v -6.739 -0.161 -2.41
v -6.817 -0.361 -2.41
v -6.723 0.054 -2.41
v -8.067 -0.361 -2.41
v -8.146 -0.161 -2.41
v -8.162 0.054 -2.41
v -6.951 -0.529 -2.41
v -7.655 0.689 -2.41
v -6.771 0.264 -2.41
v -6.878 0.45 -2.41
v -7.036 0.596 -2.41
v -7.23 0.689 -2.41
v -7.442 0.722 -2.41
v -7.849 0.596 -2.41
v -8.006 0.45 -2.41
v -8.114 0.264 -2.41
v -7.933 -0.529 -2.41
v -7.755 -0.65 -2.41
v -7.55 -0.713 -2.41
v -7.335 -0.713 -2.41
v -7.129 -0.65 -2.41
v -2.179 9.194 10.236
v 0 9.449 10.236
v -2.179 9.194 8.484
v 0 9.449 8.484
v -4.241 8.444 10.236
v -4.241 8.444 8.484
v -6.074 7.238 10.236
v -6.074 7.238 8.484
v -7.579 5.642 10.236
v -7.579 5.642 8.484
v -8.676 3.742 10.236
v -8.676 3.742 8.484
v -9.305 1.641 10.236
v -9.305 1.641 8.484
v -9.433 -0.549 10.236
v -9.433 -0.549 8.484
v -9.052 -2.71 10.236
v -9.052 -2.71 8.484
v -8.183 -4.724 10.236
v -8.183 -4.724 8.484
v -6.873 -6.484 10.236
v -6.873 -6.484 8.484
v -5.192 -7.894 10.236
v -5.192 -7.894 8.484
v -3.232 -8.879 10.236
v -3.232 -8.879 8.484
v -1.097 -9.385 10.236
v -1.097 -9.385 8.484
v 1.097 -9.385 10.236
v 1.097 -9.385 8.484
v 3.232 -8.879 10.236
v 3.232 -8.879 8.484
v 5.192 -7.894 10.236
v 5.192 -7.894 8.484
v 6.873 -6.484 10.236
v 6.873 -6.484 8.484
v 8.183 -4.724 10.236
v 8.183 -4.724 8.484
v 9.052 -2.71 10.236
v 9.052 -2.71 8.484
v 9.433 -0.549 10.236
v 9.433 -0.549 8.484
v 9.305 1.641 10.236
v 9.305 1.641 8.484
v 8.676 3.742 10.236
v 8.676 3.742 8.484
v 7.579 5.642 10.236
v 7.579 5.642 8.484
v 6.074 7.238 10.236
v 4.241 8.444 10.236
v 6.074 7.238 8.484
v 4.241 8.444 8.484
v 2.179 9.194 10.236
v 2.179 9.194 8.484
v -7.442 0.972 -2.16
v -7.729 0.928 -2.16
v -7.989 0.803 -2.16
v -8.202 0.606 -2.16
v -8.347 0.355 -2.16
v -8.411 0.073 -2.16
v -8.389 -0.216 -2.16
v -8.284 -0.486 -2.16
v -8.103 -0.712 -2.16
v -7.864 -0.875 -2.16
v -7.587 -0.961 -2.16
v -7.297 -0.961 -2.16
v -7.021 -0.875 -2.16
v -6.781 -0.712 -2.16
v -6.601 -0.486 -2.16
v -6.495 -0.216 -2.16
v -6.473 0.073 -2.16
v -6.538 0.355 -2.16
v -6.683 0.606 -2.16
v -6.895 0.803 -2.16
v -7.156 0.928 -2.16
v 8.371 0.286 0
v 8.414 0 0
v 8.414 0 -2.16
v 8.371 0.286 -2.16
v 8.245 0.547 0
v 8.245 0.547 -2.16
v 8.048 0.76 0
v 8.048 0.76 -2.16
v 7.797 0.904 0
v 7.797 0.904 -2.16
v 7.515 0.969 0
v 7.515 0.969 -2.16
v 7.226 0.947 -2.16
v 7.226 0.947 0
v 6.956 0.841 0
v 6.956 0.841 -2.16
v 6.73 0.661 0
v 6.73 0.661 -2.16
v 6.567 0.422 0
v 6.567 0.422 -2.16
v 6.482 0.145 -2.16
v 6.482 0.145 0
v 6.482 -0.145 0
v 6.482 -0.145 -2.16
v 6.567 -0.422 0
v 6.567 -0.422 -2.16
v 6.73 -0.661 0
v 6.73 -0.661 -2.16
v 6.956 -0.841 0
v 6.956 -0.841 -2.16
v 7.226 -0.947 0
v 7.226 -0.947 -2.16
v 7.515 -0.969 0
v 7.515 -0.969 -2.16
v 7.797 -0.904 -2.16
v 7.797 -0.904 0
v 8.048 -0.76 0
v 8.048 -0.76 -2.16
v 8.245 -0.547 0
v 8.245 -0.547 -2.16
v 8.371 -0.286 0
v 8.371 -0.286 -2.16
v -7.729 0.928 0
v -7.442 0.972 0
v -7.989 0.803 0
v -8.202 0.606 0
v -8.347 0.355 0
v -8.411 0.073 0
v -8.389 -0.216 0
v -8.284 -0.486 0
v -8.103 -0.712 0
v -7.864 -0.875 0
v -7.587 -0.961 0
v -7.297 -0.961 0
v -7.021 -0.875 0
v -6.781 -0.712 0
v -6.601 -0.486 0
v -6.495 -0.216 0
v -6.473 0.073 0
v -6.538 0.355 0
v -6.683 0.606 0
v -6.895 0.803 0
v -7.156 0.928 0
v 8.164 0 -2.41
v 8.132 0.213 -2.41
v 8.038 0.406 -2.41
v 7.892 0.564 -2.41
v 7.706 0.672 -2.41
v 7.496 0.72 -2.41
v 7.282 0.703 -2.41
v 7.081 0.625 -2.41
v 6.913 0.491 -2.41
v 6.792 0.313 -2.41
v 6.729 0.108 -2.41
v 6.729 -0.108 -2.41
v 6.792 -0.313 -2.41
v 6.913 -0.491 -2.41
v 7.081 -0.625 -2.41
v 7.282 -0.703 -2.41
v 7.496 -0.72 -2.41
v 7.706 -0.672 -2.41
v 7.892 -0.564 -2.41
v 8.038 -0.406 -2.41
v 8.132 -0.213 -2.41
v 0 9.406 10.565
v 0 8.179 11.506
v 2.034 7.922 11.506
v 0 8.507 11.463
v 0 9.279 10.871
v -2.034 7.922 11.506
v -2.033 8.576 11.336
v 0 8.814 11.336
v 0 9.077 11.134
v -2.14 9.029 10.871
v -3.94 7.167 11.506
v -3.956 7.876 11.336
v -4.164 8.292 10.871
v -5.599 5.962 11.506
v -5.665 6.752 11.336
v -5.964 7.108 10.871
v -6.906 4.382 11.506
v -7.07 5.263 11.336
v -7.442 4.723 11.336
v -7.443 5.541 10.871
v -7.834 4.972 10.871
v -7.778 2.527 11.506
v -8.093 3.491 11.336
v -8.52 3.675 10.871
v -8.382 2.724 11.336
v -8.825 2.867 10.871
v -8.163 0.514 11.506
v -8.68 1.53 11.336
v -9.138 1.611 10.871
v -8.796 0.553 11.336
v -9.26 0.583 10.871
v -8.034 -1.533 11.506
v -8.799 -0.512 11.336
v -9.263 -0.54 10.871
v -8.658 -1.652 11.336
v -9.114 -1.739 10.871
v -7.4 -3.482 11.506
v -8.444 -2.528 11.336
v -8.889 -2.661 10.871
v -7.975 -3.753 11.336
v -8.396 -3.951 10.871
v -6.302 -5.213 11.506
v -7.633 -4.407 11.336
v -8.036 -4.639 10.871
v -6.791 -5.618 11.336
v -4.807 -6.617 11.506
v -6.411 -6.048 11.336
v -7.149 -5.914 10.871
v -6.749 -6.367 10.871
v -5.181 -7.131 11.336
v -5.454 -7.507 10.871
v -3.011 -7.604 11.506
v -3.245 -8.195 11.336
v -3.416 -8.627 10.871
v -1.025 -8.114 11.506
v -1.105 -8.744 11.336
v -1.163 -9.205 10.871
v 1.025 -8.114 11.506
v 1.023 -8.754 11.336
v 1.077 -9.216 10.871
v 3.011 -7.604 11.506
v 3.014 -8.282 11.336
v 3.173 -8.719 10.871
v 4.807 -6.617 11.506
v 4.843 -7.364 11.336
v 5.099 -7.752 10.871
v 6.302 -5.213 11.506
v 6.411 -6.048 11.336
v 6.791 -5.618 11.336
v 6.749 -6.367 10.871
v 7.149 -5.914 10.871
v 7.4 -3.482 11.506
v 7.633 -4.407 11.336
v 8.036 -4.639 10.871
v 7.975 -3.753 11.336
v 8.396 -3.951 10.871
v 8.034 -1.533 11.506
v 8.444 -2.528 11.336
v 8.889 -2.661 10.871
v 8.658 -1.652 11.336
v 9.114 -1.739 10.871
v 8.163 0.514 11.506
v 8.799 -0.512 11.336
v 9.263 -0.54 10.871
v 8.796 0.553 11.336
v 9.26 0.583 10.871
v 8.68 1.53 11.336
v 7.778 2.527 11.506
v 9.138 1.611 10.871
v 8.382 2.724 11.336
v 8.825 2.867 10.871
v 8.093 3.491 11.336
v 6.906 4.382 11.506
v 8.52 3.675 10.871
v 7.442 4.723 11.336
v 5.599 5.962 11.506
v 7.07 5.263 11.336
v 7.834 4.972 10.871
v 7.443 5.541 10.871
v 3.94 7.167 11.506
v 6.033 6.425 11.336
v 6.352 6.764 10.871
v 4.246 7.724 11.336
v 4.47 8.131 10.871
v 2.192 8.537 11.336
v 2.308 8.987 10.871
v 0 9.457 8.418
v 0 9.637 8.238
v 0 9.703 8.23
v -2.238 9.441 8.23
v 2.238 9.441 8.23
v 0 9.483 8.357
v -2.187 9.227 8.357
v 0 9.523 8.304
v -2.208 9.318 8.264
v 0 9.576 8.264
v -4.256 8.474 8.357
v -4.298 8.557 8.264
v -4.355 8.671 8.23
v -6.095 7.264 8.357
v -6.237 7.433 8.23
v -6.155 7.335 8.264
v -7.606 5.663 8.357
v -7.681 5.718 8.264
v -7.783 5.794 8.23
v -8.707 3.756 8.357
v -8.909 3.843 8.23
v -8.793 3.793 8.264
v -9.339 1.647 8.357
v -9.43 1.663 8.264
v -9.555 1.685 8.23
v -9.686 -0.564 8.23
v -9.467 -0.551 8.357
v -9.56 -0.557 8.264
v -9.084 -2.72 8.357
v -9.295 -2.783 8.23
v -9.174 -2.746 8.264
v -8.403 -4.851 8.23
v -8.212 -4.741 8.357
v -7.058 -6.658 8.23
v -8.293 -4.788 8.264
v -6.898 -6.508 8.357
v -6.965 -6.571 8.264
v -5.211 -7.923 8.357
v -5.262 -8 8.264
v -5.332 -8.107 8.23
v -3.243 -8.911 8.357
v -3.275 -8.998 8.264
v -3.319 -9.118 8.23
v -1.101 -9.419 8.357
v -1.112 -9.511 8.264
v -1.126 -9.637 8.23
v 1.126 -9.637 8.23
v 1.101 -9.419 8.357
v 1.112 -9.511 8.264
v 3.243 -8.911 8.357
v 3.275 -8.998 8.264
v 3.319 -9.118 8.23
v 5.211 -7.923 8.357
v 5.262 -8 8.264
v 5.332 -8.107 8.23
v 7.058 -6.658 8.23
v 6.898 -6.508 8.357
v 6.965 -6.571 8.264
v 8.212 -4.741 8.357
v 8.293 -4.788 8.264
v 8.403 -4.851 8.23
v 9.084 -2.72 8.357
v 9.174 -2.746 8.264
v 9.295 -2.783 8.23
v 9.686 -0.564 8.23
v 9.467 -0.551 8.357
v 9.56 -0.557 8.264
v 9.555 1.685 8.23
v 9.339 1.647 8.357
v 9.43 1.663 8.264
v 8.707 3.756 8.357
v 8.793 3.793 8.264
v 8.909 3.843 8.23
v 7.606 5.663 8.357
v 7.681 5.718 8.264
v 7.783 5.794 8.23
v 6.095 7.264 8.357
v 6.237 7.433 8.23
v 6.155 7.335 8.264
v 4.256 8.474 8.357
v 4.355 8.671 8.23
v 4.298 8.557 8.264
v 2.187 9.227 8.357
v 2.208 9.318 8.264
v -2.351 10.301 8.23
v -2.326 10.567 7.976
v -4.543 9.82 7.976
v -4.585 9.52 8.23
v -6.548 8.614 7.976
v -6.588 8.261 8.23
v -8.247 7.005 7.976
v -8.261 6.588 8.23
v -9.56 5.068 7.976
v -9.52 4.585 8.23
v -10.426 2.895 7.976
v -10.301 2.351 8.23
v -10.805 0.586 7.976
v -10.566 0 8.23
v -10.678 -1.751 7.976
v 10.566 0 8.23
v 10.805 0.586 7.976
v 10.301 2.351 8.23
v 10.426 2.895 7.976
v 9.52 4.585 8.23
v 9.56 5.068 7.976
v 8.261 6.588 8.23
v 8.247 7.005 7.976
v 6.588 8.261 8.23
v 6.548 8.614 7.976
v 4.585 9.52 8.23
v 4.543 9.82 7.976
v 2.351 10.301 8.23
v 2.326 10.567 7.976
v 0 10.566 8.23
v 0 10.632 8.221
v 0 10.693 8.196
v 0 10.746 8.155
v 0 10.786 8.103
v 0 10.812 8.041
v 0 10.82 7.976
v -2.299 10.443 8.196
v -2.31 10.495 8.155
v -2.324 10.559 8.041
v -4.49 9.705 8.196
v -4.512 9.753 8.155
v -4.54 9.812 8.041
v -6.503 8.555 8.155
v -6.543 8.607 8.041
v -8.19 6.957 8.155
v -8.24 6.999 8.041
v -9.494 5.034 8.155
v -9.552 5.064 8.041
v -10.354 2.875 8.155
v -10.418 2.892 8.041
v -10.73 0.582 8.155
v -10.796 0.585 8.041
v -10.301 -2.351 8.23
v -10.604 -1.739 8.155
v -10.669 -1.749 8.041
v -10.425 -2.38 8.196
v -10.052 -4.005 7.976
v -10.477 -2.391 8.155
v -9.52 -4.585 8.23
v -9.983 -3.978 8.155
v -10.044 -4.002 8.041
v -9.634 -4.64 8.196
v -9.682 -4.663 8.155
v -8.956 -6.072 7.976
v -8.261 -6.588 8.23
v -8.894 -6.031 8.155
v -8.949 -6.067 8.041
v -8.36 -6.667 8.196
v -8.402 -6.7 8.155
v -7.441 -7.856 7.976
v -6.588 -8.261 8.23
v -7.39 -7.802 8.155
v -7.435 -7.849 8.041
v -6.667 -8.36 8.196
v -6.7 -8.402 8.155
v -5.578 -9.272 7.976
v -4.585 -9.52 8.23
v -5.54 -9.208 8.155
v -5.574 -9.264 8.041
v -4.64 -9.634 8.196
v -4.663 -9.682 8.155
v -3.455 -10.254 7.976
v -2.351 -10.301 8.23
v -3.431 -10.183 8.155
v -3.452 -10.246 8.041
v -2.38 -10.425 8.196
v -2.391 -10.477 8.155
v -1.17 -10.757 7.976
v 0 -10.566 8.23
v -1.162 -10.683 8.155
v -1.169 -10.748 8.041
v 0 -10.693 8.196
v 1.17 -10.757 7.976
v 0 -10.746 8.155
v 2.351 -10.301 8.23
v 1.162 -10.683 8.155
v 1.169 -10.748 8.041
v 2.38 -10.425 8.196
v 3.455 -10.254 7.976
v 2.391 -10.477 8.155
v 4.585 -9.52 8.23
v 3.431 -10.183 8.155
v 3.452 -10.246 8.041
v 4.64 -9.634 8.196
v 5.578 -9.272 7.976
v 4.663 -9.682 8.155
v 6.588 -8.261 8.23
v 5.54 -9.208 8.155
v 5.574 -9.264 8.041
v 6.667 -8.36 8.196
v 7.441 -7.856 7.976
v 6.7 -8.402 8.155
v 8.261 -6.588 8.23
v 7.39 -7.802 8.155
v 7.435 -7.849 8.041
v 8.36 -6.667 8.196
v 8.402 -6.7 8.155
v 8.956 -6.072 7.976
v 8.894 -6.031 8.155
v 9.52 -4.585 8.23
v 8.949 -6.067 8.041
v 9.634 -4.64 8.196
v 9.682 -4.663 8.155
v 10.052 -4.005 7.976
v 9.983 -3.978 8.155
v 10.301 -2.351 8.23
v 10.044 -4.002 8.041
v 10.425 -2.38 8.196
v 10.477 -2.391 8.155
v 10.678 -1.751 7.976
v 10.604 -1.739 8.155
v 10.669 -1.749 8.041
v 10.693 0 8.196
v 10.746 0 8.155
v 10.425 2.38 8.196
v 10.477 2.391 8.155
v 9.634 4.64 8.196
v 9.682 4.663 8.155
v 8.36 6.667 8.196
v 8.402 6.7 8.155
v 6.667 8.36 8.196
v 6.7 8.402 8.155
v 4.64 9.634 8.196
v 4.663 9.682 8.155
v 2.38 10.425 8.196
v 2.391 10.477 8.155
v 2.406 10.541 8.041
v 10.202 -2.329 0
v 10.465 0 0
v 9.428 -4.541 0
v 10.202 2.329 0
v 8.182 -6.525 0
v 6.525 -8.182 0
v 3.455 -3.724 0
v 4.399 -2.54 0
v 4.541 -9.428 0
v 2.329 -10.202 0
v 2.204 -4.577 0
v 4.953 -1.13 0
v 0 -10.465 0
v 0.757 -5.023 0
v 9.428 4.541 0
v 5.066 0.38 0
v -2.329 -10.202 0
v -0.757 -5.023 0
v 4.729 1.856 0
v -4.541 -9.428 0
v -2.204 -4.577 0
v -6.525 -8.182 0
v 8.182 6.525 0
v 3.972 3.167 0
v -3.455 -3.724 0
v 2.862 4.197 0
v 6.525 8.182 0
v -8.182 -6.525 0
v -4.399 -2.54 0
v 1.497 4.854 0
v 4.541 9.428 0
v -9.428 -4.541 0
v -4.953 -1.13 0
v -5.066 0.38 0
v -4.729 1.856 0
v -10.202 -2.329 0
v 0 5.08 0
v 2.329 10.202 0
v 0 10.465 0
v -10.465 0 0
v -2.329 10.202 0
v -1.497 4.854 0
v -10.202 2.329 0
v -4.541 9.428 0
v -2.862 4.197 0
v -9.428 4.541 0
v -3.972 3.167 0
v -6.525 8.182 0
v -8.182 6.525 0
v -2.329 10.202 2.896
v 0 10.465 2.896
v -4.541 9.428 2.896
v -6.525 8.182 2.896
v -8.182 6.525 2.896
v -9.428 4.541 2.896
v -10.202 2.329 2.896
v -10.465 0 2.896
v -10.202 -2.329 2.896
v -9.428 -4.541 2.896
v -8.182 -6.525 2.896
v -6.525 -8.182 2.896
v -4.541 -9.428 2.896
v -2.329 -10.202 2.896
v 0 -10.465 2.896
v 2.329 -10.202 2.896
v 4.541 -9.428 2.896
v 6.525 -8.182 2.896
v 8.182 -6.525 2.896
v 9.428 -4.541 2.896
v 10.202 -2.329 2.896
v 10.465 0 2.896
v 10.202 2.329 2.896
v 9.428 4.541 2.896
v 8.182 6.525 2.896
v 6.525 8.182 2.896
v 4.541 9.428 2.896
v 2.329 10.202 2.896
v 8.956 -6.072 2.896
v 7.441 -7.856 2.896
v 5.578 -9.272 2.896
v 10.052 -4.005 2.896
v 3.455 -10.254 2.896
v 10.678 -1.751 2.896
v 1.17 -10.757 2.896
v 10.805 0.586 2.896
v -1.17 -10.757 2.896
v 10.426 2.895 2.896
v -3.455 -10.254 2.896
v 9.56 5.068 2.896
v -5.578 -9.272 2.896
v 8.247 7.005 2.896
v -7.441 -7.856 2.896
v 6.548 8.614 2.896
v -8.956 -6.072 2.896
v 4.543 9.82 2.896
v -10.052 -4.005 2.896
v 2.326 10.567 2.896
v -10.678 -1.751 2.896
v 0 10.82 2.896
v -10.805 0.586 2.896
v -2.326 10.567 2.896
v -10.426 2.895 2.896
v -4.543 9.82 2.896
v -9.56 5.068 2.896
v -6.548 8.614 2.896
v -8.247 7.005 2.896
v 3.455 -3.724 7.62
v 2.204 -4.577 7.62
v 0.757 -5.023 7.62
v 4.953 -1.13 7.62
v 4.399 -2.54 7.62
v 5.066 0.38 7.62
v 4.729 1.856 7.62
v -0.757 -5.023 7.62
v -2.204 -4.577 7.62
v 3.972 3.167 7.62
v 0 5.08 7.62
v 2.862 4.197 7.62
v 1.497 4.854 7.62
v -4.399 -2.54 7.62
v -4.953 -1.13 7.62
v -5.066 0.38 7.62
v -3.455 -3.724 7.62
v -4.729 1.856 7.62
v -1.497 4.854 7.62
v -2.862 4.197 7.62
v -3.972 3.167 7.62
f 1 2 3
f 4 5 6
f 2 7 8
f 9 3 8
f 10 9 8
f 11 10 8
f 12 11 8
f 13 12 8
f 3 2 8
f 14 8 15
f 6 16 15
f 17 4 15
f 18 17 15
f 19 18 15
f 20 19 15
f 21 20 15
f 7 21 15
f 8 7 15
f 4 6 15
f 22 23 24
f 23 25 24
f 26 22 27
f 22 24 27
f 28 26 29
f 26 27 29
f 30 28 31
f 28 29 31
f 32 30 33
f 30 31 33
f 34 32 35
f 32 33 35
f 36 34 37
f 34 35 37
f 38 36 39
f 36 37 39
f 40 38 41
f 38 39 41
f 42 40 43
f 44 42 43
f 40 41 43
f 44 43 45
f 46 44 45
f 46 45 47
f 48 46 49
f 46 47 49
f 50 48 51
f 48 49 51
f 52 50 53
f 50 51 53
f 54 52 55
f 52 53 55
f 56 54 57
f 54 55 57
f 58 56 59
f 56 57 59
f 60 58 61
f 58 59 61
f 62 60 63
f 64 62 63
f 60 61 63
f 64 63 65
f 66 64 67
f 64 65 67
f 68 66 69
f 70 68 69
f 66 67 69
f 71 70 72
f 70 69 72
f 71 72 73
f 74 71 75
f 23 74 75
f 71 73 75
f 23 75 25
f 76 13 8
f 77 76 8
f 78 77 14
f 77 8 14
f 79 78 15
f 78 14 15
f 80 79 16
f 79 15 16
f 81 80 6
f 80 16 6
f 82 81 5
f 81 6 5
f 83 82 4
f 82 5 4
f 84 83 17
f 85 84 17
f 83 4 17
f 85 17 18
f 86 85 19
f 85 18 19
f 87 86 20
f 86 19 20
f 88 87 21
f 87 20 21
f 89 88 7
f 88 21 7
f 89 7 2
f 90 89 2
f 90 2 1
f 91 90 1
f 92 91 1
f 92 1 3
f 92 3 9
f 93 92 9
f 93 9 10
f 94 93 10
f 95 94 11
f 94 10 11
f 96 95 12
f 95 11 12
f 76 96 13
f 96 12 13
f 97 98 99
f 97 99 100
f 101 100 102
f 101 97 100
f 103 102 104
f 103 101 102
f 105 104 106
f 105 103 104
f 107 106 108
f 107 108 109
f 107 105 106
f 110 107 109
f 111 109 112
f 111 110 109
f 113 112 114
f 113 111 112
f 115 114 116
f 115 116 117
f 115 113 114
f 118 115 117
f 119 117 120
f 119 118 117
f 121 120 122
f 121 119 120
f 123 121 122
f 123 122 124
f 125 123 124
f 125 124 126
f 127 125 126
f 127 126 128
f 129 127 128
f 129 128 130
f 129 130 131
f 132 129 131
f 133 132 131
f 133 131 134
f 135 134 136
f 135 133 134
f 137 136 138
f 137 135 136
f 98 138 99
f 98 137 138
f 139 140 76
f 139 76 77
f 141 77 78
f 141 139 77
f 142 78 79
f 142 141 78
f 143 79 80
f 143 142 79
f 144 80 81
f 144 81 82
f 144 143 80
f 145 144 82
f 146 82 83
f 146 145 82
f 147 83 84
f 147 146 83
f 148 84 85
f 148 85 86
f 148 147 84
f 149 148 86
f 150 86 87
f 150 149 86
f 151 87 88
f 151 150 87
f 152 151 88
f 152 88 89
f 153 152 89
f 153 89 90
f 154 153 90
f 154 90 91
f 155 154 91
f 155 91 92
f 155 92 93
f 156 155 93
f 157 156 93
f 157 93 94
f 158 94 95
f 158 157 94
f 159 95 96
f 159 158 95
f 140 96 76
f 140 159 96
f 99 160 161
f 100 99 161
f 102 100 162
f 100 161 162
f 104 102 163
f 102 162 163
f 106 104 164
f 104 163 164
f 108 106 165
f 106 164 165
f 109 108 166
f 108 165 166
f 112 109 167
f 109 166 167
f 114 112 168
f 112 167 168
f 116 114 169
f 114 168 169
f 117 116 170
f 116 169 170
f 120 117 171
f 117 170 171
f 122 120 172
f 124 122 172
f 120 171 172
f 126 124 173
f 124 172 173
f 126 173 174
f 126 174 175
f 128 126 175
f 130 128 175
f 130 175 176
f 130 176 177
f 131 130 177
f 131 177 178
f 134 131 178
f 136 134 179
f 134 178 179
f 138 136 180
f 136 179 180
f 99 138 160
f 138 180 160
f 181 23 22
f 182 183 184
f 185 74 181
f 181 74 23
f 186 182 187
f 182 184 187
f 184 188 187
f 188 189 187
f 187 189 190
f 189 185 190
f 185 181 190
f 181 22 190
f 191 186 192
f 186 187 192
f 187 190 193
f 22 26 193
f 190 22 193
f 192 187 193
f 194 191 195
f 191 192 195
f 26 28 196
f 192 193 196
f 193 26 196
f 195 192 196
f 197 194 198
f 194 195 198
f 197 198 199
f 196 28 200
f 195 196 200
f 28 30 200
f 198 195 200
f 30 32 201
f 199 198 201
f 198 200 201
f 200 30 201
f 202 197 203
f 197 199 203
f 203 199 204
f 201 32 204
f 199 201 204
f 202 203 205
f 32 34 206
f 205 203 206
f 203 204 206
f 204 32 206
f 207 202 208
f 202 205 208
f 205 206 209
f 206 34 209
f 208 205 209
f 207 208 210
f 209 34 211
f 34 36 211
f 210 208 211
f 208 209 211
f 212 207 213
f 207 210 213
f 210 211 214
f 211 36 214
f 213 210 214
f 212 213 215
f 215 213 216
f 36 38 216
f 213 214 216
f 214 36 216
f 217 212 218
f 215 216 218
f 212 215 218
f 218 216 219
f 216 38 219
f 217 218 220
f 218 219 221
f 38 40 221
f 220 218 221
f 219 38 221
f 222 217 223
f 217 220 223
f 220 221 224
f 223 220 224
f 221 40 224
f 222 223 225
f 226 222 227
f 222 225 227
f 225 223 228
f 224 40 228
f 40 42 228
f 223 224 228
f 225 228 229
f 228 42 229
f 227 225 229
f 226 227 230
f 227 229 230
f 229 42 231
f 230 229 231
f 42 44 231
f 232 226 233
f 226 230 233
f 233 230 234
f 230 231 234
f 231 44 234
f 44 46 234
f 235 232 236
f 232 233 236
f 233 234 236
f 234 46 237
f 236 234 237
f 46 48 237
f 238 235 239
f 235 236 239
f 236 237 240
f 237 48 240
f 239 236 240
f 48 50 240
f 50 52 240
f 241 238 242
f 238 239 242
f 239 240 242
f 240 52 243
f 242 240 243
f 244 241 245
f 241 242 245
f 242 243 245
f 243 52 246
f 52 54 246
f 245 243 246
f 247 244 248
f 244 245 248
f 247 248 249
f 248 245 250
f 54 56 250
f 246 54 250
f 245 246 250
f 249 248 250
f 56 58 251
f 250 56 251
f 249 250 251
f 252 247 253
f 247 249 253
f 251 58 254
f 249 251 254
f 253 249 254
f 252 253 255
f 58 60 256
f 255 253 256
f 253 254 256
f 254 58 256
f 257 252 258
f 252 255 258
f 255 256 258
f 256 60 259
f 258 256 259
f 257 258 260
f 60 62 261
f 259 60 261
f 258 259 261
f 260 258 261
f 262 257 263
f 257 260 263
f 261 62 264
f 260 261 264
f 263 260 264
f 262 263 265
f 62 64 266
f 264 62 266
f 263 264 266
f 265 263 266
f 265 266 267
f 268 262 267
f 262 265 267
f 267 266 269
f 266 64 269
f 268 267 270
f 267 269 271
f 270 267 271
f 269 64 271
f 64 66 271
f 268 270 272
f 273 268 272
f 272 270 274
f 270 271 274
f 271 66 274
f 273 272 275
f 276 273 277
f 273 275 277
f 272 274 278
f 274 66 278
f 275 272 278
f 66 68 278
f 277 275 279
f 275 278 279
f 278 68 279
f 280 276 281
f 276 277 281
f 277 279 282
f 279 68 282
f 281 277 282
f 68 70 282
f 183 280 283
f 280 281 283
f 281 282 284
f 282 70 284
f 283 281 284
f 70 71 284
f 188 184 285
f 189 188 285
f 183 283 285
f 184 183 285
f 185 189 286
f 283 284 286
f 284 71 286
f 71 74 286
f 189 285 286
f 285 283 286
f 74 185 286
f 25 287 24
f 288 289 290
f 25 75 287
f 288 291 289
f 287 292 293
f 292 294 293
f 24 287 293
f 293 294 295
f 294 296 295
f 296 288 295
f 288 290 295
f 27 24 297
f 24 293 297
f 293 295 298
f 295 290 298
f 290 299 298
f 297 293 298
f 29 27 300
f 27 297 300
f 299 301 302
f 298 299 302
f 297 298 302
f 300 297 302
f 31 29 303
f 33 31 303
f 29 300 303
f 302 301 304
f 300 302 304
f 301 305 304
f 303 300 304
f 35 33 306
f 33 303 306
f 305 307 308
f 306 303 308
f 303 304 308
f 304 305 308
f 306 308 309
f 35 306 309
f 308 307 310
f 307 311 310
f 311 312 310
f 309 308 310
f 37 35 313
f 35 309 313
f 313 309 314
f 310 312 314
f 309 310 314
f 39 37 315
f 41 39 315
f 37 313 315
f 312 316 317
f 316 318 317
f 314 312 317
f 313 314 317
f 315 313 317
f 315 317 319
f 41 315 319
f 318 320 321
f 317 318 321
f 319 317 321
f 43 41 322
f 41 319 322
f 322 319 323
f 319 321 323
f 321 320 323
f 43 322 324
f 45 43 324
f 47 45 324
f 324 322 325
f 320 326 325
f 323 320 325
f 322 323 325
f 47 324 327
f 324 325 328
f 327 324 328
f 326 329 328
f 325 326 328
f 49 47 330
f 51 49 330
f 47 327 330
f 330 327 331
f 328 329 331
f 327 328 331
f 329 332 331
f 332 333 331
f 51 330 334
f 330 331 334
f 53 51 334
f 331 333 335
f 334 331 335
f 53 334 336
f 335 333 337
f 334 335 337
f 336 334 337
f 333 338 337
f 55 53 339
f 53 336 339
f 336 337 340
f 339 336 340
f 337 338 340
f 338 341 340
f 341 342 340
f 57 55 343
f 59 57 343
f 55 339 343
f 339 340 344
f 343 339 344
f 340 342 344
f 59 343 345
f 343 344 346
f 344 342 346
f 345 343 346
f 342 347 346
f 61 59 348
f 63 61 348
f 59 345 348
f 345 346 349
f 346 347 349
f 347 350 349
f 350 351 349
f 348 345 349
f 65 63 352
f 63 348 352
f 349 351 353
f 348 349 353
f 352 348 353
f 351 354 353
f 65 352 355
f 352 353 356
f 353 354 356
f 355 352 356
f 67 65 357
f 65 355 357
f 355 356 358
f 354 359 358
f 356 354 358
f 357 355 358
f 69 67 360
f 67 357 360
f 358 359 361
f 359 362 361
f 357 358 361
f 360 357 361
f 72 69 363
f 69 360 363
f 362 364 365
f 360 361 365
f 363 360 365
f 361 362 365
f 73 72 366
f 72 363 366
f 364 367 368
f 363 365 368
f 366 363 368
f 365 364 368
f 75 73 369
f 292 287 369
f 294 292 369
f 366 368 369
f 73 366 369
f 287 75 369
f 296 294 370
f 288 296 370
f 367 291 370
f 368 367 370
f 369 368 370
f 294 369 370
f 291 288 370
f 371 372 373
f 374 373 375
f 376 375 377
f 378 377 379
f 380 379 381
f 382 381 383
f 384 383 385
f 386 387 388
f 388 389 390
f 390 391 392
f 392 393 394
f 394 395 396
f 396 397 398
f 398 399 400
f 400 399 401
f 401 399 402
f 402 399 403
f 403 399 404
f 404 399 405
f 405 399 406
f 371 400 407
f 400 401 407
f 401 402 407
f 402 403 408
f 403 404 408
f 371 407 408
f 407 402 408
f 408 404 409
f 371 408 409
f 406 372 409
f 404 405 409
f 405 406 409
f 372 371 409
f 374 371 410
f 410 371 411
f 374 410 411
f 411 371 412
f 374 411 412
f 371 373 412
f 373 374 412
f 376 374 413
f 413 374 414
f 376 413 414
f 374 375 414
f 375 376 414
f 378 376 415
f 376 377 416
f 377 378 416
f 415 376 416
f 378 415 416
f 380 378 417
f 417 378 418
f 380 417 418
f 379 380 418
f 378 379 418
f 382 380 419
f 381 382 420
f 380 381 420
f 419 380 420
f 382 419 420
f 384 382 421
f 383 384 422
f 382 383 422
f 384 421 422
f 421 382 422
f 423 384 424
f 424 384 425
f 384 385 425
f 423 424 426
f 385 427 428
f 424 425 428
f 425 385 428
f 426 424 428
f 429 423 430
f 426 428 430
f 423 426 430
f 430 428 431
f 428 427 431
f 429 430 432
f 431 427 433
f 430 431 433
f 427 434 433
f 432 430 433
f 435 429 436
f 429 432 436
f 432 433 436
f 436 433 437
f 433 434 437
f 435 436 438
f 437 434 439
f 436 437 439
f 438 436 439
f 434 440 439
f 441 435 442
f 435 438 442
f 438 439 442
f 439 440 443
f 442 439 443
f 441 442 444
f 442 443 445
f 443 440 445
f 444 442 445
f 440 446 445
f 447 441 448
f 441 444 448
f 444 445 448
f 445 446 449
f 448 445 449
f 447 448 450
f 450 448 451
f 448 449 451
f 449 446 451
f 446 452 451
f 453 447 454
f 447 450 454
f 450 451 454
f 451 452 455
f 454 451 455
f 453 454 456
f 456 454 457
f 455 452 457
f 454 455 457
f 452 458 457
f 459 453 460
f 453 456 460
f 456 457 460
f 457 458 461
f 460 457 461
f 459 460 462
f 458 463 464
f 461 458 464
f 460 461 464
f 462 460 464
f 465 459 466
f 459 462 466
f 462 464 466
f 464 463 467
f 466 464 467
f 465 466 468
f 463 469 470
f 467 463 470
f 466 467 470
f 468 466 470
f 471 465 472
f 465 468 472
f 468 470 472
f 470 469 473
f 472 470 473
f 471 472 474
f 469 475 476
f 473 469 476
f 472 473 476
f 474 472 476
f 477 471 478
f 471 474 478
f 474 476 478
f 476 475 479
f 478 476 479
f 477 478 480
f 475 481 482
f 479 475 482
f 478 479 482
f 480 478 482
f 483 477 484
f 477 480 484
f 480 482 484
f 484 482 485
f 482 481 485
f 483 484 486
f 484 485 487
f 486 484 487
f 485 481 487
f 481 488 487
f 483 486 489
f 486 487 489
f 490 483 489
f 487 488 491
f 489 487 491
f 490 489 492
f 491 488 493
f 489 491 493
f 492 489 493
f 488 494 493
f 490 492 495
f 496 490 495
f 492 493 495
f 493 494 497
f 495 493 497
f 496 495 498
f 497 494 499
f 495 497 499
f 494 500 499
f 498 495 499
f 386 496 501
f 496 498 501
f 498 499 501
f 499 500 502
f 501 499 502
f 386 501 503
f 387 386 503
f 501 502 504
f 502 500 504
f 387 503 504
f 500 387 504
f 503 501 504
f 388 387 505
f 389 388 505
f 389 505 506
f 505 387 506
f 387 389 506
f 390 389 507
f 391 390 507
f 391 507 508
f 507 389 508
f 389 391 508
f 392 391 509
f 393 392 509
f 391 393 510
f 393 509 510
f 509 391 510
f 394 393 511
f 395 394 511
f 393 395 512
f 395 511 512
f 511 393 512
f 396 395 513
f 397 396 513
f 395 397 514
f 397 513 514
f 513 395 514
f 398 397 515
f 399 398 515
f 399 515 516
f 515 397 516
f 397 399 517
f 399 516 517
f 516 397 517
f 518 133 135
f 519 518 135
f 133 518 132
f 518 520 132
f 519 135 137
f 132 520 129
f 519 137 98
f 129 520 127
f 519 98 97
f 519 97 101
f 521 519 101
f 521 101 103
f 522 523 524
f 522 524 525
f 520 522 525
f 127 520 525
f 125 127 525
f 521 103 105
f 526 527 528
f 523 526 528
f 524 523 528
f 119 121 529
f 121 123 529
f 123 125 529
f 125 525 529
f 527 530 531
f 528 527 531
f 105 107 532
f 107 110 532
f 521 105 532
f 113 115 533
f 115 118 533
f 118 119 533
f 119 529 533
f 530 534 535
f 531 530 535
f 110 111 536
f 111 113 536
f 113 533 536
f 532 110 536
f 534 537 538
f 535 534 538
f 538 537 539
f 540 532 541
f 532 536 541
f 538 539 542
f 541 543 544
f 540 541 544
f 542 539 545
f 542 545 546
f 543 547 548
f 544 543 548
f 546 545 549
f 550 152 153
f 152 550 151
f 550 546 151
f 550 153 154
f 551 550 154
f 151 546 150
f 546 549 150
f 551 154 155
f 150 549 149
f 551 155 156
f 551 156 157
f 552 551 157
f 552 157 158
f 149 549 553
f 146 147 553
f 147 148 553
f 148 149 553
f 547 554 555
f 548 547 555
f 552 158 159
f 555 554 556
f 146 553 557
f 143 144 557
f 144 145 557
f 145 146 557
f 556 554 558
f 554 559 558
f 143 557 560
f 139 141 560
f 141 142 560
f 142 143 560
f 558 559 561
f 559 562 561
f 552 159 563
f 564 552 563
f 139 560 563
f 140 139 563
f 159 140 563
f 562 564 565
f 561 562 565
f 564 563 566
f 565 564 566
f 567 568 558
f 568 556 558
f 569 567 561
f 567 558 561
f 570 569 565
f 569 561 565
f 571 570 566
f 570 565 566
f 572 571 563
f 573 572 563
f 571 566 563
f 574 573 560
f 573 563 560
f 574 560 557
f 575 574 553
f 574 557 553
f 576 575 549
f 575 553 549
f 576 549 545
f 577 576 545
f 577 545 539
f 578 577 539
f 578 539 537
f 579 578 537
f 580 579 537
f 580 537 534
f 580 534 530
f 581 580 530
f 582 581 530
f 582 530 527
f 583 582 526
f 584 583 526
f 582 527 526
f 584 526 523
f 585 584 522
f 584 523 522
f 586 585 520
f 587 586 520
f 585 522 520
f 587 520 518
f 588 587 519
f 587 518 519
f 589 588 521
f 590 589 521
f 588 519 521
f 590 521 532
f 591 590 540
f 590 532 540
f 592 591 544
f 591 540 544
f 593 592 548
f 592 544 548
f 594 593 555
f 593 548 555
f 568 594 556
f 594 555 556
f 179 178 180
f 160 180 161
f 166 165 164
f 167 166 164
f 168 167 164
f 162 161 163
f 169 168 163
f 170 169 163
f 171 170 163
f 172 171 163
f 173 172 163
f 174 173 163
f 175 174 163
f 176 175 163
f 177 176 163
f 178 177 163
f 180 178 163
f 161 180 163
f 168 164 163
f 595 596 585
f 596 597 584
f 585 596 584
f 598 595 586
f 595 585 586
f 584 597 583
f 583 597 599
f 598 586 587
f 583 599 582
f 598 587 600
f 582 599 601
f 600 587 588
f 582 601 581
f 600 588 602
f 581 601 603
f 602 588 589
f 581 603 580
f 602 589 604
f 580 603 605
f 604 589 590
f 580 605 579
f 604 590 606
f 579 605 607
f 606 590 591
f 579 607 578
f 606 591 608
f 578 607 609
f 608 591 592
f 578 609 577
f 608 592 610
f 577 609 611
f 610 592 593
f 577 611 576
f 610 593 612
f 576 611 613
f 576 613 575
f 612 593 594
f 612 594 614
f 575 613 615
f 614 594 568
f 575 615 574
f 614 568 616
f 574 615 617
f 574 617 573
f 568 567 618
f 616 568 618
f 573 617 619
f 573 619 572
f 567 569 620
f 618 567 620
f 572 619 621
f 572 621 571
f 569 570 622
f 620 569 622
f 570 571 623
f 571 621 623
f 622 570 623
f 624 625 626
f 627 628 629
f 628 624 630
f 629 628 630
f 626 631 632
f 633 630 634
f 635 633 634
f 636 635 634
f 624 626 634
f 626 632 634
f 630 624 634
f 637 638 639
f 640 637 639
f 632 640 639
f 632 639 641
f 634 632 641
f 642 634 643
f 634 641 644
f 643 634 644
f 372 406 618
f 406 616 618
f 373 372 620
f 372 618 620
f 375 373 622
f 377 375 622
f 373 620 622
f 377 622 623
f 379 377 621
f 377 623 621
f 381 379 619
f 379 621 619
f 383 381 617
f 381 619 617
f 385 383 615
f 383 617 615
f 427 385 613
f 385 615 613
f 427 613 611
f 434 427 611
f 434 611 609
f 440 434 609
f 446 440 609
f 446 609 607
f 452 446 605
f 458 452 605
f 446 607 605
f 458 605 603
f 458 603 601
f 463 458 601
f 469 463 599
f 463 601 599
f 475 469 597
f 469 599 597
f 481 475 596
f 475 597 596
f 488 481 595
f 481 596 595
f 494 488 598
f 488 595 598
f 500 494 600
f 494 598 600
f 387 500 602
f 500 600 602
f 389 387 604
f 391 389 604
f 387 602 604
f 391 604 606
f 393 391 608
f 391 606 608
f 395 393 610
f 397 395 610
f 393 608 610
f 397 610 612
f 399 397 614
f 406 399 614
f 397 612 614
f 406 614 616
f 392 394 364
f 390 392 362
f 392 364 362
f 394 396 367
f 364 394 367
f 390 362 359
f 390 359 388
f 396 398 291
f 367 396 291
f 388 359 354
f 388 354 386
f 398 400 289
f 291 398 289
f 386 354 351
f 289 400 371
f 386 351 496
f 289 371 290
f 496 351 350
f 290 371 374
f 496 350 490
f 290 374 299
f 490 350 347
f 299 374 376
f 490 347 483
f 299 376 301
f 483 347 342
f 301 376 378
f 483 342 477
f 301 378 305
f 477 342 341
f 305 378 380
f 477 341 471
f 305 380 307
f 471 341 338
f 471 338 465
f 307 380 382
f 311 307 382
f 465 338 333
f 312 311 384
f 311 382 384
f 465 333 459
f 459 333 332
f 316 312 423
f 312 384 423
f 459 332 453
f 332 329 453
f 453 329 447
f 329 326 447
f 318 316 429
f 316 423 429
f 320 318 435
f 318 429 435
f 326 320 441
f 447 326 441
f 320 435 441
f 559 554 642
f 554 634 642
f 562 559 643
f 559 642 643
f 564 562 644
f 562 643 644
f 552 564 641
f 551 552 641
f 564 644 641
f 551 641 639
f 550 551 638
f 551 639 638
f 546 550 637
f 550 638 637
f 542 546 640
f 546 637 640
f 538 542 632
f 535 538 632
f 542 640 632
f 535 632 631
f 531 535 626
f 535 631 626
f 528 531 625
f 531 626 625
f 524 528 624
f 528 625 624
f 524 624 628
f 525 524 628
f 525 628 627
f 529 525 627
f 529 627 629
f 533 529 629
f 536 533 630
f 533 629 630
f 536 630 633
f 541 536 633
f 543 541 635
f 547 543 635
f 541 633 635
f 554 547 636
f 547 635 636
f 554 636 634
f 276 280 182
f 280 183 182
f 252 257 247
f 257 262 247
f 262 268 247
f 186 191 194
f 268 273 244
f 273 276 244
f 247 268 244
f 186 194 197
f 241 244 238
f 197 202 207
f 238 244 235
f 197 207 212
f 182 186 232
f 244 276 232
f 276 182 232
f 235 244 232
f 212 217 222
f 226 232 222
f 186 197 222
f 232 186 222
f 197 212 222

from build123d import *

# Parameters (mm, degrees)
SKETCH3_R      = 0.97155
EXTRUDE2_DEPTH = 2.41
CHAMFER1_SIZE  = 0.25


with BuildPart() as part:
    # Sketch2 → Revolve1 (revolve)
    with BuildSketch(Plane(origin=(0, 0, 0), x_dir=(0, 0, -1), z_dir=(1, 0, 0))):
        with BuildLine():
            Line((-7.62, 0), (-11.5062, 0))
            Line((-11.5062, 0), (-11.5062, 8.178792884))
            ThreePointArc((-11.5062, 8.178792884), (-11.134225612, 9.076818496), (-10.2362, 9.448792884))
            Line((-10.2362, 9.448792884), (-8.483598247, 9.448792884))
            ThreePointArc((-8.483598247, 9.448792884), (-8.303993125, 9.523187762), (-8.229598247, 9.702792884))
            Line((-8.229598247, 9.702792884), (-8.229598247, 10.566392884))
            ThreePointArc((-8.229598247, 10.566392884), (-8.15520337, 10.745998007), (-7.975598247, 10.820392884))
            Line((-7.975598247, 10.820392884), (-2.895598247, 10.820392884))
            Line((-2.895598247, 10.820392884), (-2.895598247, 10.464792884))
            Line((-2.895598247, 10.464792884), (0, 10.464792884))
            Line((0, 10.464792884), (0, 5.08))
            Line((0, 5.08), (-7.62, 5.08))
            Line((-7.62, 5.08), (-7.62, 0))
        make_face()
    revolve(axis=Axis((0, 0, 0), (0, 0, 1)))

    # Sketch3 → Extrude2 (add)
    with BuildSketch(Plane.XY):
        with Locations((7.4422, 0)):
            Circle(SKETCH3_R)
        with Locations(Location((-7.4422, 0, 0), (0, 0, 90))):
            Circle(SKETCH3_R)
    extrude(amount=-EXTRUDE2_DEPTH)

    # Chamfer1
    chamfer1_edges = [part.edges().sort_by_distance(p)[0] for p in [
        (6.47065, 0, -2.41),
        (-7.4422, -0.97155, -2.41),
    ]]
    chamfer(chamfer1_edges, length=CHAMFER1_SIZE)


solid = part.part
